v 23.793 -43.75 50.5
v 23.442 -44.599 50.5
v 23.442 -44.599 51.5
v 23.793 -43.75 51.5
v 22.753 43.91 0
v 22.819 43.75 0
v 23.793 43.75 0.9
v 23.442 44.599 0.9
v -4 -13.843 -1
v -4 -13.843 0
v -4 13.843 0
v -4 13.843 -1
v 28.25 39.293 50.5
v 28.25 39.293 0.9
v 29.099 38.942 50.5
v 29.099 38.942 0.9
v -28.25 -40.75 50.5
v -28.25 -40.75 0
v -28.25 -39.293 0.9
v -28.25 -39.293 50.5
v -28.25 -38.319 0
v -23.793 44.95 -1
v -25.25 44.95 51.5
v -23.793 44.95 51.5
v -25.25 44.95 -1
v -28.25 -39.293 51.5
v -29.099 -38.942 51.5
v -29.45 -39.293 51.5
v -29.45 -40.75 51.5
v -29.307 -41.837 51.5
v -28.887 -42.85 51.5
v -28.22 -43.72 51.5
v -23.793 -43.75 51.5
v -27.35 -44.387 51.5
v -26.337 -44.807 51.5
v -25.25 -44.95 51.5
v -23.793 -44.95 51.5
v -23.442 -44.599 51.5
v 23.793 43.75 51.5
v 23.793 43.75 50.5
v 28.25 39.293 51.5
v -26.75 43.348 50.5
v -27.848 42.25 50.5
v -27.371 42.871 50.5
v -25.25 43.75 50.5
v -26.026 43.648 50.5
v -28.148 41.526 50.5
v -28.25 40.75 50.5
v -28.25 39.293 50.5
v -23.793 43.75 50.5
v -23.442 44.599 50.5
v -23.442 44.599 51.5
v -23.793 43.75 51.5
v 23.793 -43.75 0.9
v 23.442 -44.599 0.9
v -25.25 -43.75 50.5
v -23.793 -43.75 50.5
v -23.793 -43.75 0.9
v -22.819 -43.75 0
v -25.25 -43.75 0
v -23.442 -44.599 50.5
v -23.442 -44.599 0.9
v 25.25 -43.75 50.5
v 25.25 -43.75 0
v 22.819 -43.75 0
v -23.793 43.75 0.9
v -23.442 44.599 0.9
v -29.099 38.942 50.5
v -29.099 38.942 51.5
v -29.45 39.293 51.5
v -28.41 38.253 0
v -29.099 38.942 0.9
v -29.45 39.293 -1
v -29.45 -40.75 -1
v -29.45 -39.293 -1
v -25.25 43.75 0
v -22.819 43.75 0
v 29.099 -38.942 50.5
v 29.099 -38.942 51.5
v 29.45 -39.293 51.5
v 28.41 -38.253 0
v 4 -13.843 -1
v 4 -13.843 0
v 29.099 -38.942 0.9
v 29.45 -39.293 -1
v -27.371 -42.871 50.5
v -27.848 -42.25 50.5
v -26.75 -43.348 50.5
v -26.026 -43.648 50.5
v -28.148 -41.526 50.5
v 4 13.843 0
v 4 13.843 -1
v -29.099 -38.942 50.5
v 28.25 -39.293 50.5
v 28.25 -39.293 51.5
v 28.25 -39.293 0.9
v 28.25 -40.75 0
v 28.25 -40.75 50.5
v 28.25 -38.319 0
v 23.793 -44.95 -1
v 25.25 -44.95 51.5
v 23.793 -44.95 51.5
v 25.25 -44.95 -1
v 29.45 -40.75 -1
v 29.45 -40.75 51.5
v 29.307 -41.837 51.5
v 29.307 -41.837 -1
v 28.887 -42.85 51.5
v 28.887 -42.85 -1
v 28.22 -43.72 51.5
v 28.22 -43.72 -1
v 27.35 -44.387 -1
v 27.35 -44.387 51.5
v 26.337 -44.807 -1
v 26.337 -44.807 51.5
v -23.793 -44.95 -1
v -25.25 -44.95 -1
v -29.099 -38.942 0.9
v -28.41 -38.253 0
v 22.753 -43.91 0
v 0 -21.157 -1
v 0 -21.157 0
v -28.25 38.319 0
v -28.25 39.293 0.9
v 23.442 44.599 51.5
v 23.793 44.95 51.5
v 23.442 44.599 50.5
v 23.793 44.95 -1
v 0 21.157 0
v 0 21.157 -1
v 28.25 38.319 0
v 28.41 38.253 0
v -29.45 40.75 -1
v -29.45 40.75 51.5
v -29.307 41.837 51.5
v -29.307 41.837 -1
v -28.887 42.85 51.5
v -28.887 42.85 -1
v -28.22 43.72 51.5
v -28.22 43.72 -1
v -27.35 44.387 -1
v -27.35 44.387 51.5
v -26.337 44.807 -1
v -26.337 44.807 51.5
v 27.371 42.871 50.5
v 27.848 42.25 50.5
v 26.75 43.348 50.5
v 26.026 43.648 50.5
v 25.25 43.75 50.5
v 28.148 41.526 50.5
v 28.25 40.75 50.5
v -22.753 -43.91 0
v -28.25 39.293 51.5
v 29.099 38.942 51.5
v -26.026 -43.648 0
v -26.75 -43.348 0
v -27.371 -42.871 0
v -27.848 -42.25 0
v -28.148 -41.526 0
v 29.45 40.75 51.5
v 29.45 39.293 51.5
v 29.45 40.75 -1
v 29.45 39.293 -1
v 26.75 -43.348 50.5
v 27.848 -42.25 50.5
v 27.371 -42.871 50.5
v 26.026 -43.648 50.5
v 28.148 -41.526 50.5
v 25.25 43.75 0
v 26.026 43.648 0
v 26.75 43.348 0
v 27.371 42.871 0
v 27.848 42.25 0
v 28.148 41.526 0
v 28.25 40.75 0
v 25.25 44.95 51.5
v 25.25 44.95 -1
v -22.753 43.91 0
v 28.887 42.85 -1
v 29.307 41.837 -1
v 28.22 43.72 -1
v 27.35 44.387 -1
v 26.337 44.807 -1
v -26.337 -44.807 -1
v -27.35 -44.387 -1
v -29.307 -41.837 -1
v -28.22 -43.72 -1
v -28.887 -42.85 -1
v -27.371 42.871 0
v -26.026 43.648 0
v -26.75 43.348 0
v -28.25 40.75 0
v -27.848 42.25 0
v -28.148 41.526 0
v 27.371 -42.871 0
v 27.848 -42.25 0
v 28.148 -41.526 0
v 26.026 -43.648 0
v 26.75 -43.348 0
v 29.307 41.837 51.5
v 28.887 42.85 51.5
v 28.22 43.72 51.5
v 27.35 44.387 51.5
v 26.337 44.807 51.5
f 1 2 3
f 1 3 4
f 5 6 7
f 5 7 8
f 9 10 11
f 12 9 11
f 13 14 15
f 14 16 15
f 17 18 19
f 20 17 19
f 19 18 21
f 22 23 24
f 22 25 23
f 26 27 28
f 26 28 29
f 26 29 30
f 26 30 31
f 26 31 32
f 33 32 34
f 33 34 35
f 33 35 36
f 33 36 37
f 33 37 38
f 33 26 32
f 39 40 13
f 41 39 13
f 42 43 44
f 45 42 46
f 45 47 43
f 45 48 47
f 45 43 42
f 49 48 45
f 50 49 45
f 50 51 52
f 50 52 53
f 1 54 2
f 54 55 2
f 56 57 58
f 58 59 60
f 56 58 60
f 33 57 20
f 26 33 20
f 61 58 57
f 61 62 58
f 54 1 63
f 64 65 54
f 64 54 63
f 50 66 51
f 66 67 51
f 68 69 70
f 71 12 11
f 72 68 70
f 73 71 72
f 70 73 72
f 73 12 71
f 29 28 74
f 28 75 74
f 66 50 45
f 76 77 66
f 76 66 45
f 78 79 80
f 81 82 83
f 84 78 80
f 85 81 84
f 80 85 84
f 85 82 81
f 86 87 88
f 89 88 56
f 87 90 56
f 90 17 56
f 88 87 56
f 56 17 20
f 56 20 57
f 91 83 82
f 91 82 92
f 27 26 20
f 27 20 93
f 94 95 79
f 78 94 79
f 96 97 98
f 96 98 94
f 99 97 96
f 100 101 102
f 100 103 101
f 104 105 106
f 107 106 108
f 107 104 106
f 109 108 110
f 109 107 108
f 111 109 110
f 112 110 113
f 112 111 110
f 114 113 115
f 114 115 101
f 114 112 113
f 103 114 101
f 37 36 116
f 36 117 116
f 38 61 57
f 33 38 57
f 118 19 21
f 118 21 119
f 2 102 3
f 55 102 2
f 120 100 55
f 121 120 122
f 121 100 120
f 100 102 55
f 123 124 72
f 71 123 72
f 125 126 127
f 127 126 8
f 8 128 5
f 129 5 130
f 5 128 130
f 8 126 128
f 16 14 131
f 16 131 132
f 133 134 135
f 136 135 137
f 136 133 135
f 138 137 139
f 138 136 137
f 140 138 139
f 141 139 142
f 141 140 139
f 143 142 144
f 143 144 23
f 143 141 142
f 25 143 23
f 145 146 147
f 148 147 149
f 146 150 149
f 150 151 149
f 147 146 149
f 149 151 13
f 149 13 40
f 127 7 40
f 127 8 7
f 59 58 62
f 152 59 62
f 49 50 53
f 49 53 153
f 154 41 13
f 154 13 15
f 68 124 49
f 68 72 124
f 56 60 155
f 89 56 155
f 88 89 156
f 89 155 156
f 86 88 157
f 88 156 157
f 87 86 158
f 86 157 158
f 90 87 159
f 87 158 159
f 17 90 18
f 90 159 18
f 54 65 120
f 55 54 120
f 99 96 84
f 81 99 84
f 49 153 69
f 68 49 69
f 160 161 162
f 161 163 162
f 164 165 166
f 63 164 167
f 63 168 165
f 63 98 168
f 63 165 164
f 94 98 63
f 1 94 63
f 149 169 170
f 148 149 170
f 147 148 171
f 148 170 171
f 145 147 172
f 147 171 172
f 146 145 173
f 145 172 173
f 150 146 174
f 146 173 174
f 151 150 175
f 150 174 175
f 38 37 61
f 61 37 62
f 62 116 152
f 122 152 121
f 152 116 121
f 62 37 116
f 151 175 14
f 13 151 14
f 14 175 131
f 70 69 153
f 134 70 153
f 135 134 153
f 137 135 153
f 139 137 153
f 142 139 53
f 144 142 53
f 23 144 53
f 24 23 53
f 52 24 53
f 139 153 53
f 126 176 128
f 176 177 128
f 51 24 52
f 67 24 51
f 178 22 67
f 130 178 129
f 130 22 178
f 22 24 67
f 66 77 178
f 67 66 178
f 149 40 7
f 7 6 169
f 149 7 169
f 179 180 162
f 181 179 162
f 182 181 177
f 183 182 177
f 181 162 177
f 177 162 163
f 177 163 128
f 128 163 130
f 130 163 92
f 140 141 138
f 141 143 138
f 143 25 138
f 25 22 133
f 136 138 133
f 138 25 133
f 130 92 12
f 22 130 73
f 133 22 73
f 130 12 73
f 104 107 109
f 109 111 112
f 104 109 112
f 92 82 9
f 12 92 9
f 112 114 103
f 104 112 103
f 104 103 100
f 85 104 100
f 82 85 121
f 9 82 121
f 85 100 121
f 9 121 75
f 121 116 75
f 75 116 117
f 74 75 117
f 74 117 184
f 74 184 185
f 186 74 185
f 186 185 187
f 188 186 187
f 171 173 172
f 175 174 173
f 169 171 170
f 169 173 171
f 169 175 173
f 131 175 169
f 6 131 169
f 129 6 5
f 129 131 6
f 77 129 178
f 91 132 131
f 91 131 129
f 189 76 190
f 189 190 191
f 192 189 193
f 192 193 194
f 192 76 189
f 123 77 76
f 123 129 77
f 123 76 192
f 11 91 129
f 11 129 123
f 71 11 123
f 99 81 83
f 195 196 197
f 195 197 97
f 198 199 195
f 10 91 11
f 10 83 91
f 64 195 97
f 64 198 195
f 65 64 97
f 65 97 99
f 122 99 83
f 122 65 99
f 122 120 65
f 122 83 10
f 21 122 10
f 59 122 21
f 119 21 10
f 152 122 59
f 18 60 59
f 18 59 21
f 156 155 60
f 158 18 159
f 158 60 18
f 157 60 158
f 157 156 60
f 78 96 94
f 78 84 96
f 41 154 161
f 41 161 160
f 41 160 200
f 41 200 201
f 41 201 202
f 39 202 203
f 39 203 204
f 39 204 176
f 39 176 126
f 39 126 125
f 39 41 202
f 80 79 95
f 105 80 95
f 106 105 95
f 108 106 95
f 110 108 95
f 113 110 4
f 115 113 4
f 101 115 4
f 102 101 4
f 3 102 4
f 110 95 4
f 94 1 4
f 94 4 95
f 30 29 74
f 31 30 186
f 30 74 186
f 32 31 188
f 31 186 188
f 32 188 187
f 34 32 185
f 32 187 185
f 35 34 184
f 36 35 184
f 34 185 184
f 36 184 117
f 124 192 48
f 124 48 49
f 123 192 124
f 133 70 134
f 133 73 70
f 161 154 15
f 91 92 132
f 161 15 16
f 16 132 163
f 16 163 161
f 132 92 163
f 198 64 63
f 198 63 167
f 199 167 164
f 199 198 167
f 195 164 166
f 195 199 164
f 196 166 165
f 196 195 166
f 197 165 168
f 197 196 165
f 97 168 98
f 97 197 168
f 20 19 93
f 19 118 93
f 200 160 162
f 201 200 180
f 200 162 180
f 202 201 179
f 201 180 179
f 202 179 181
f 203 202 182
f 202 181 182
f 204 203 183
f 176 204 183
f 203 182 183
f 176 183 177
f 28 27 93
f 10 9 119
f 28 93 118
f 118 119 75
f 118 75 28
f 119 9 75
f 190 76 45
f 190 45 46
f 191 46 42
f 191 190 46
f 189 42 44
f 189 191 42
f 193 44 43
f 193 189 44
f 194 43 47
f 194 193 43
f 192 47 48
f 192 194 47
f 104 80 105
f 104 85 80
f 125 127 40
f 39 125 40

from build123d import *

# Parameters (mm, degrees)
F2_DEPTH = 1
F3_DEPTH = 50.5
F4_SIZE  = 1.2
F5_SIZE  = 0.9
F7_DEPTH = 1


with BuildPart() as f2:
    # F1 (on Top) → F2 (new body)
    with BuildSketch(Plane.XY):
        with BuildLine():
            Line((0, 0), (-4, 0))
            Line((-4, 0), (-4, -13.8431457505))
            Line((-4, -13.8431457505), (-28.25, -38.0931457505))
            Line((-28.25, -38.0931457505), (-28.25, -40.75))
            ThreePointArc((-28.25, -40.75), (-27.3713203436, -42.8713203436), (-25.25, -43.75))
            Line((-25.25, -43.75), (-22.5931457505, -43.75))
            Line((-22.5931457505, -43.75), (0, -21.1568542495))
            Line((0, -21.1568542495), (0, 0))
        make_face()
        with BuildLine():
            Line((-28.25, -40.75), (-28.25, -38.0931457505))
            Line((-28.25, -38.0931457505), (-29.45, -39.2931457505))
            Line((-29.45, -39.2931457505), (-29.45, -40.75))
            ThreePointArc((-29.45, -40.75), (-28.219848481, -43.719848481), (-25.25, -44.95))
            Line((-25.25, -44.95), (-23.7931457505, -44.95))
            Line((-23.7931457505, -44.95), (-22.5931457505, -43.75))
            Line((-22.5931457505, -43.75), (-25.25, -43.75))
            ThreePointArc((-25.25, -43.75), (-27.3713203436, -42.8713203436), (-28.25, -40.75))
        make_face()
    extrude(amount=-F2_DEPTH)

    # F1 (on Top) → F3 (join)
    with BuildSketch(Plane.XY):
        with BuildLine():
            Line((-28.25, -40.75), (-28.25, -38.0931457505))
            Line((-28.25, -38.0931457505), (-29.45, -39.2931457505))
            Line((-29.45, -39.2931457505), (-29.45, -40.75))
            ThreePointArc((-29.45, -40.75), (-28.219848481, -43.719848481), (-25.25, -44.95))
            Line((-25.25, -44.95), (-23.7931457505, -44.95))
            Line((-23.7931457505, -44.95), (-22.5931457505, -43.75))
            Line((-22.5931457505, -43.75), (-25.25, -43.75))
            ThreePointArc((-25.25, -43.75), (-27.3713203436, -42.8713203436), (-28.25, -40.75))
        make_face()
    extrude(amount=F3_DEPTH)

    # F4
    f4_edges = [f2.edges().sort_by_distance(p)[0] for p in [
        (-28.25, -38.093146, 25.25),
        (-22.593146, -43.75, 25.25),
    ]]
    chamfer(f4_edges, length=F4_SIZE)

    # F5
    f5_edges = [f2.edges().sort_by_distance(p)[0] for p in [
        (-23.61741, -44.174264, 0),
        (-28.674264, -39.11741, 0),
    ]]
    chamfer(f5_edges, length=F5_SIZE)

    # F6 (on face) → F7 (join)
    with BuildSketch(Plane.XY.offset(50.5)):
        with BuildLine():
            Line((-25.25, -43.75), (-23.7931457505, -43.75))
            Line((-23.7931457505, -43.75), (-28.25, -39.2931457505))
            Line((-28.25, -39.2931457505), (-28.25, -40.75))
            ThreePointArc((-28.25, -40.75), (-27.3713203436, -42.8713203436), (-25.25, -43.75))
        make_face()
        with BuildLine():
            Line((-23.4416738879, -44.5985281374), (-23.7931457505, -43.75))
            Line((-23.7931457505, -43.75), (-25.25, -43.75))
            ThreePointArc((-25.25, -43.75), (-27.3713203436, -42.8713203436), (-28.25, -40.75))
            Line((-28.25, -40.75), (-28.25, -39.2931457505))
            Line((-28.25, -39.2931457505), (-29.0985281374, -38.9416738879))
            Line((-29.0985281374, -38.9416738879), (-29.45, -39.2931457505))
            Line((-29.45, -39.2931457505), (-29.45, -40.75))
            ThreePointArc((-29.45, -40.75), (-28.219848481, -43.719848481), (-25.25, -44.95))
            Line((-25.25, -44.95), (-23.7931457505, -44.95))
            Line((-23.7931457505, -44.95), (-23.4416738879, -44.5985281374))
        make_face()
    extrude(amount=F7_DEPTH)

    # F8: F2 across face


with BuildPart() as f2_1:
    add(f2.part)
    add(f2.part.mirror(Plane(origin=(0, -10.5784271247, -0.5), x_dir=(0, 1, 0), z_dir=(1, 0, 0))))

    # F9: F2 across face


with BuildPart() as f2_2:
    add(f2_1.part)
    add(f2_1.part.mirror(Plane(origin=(0, 0, -0.5), x_dir=(-1, 0, 0), z_dir=(0, 1, 0))))


solid = f2_2.part
